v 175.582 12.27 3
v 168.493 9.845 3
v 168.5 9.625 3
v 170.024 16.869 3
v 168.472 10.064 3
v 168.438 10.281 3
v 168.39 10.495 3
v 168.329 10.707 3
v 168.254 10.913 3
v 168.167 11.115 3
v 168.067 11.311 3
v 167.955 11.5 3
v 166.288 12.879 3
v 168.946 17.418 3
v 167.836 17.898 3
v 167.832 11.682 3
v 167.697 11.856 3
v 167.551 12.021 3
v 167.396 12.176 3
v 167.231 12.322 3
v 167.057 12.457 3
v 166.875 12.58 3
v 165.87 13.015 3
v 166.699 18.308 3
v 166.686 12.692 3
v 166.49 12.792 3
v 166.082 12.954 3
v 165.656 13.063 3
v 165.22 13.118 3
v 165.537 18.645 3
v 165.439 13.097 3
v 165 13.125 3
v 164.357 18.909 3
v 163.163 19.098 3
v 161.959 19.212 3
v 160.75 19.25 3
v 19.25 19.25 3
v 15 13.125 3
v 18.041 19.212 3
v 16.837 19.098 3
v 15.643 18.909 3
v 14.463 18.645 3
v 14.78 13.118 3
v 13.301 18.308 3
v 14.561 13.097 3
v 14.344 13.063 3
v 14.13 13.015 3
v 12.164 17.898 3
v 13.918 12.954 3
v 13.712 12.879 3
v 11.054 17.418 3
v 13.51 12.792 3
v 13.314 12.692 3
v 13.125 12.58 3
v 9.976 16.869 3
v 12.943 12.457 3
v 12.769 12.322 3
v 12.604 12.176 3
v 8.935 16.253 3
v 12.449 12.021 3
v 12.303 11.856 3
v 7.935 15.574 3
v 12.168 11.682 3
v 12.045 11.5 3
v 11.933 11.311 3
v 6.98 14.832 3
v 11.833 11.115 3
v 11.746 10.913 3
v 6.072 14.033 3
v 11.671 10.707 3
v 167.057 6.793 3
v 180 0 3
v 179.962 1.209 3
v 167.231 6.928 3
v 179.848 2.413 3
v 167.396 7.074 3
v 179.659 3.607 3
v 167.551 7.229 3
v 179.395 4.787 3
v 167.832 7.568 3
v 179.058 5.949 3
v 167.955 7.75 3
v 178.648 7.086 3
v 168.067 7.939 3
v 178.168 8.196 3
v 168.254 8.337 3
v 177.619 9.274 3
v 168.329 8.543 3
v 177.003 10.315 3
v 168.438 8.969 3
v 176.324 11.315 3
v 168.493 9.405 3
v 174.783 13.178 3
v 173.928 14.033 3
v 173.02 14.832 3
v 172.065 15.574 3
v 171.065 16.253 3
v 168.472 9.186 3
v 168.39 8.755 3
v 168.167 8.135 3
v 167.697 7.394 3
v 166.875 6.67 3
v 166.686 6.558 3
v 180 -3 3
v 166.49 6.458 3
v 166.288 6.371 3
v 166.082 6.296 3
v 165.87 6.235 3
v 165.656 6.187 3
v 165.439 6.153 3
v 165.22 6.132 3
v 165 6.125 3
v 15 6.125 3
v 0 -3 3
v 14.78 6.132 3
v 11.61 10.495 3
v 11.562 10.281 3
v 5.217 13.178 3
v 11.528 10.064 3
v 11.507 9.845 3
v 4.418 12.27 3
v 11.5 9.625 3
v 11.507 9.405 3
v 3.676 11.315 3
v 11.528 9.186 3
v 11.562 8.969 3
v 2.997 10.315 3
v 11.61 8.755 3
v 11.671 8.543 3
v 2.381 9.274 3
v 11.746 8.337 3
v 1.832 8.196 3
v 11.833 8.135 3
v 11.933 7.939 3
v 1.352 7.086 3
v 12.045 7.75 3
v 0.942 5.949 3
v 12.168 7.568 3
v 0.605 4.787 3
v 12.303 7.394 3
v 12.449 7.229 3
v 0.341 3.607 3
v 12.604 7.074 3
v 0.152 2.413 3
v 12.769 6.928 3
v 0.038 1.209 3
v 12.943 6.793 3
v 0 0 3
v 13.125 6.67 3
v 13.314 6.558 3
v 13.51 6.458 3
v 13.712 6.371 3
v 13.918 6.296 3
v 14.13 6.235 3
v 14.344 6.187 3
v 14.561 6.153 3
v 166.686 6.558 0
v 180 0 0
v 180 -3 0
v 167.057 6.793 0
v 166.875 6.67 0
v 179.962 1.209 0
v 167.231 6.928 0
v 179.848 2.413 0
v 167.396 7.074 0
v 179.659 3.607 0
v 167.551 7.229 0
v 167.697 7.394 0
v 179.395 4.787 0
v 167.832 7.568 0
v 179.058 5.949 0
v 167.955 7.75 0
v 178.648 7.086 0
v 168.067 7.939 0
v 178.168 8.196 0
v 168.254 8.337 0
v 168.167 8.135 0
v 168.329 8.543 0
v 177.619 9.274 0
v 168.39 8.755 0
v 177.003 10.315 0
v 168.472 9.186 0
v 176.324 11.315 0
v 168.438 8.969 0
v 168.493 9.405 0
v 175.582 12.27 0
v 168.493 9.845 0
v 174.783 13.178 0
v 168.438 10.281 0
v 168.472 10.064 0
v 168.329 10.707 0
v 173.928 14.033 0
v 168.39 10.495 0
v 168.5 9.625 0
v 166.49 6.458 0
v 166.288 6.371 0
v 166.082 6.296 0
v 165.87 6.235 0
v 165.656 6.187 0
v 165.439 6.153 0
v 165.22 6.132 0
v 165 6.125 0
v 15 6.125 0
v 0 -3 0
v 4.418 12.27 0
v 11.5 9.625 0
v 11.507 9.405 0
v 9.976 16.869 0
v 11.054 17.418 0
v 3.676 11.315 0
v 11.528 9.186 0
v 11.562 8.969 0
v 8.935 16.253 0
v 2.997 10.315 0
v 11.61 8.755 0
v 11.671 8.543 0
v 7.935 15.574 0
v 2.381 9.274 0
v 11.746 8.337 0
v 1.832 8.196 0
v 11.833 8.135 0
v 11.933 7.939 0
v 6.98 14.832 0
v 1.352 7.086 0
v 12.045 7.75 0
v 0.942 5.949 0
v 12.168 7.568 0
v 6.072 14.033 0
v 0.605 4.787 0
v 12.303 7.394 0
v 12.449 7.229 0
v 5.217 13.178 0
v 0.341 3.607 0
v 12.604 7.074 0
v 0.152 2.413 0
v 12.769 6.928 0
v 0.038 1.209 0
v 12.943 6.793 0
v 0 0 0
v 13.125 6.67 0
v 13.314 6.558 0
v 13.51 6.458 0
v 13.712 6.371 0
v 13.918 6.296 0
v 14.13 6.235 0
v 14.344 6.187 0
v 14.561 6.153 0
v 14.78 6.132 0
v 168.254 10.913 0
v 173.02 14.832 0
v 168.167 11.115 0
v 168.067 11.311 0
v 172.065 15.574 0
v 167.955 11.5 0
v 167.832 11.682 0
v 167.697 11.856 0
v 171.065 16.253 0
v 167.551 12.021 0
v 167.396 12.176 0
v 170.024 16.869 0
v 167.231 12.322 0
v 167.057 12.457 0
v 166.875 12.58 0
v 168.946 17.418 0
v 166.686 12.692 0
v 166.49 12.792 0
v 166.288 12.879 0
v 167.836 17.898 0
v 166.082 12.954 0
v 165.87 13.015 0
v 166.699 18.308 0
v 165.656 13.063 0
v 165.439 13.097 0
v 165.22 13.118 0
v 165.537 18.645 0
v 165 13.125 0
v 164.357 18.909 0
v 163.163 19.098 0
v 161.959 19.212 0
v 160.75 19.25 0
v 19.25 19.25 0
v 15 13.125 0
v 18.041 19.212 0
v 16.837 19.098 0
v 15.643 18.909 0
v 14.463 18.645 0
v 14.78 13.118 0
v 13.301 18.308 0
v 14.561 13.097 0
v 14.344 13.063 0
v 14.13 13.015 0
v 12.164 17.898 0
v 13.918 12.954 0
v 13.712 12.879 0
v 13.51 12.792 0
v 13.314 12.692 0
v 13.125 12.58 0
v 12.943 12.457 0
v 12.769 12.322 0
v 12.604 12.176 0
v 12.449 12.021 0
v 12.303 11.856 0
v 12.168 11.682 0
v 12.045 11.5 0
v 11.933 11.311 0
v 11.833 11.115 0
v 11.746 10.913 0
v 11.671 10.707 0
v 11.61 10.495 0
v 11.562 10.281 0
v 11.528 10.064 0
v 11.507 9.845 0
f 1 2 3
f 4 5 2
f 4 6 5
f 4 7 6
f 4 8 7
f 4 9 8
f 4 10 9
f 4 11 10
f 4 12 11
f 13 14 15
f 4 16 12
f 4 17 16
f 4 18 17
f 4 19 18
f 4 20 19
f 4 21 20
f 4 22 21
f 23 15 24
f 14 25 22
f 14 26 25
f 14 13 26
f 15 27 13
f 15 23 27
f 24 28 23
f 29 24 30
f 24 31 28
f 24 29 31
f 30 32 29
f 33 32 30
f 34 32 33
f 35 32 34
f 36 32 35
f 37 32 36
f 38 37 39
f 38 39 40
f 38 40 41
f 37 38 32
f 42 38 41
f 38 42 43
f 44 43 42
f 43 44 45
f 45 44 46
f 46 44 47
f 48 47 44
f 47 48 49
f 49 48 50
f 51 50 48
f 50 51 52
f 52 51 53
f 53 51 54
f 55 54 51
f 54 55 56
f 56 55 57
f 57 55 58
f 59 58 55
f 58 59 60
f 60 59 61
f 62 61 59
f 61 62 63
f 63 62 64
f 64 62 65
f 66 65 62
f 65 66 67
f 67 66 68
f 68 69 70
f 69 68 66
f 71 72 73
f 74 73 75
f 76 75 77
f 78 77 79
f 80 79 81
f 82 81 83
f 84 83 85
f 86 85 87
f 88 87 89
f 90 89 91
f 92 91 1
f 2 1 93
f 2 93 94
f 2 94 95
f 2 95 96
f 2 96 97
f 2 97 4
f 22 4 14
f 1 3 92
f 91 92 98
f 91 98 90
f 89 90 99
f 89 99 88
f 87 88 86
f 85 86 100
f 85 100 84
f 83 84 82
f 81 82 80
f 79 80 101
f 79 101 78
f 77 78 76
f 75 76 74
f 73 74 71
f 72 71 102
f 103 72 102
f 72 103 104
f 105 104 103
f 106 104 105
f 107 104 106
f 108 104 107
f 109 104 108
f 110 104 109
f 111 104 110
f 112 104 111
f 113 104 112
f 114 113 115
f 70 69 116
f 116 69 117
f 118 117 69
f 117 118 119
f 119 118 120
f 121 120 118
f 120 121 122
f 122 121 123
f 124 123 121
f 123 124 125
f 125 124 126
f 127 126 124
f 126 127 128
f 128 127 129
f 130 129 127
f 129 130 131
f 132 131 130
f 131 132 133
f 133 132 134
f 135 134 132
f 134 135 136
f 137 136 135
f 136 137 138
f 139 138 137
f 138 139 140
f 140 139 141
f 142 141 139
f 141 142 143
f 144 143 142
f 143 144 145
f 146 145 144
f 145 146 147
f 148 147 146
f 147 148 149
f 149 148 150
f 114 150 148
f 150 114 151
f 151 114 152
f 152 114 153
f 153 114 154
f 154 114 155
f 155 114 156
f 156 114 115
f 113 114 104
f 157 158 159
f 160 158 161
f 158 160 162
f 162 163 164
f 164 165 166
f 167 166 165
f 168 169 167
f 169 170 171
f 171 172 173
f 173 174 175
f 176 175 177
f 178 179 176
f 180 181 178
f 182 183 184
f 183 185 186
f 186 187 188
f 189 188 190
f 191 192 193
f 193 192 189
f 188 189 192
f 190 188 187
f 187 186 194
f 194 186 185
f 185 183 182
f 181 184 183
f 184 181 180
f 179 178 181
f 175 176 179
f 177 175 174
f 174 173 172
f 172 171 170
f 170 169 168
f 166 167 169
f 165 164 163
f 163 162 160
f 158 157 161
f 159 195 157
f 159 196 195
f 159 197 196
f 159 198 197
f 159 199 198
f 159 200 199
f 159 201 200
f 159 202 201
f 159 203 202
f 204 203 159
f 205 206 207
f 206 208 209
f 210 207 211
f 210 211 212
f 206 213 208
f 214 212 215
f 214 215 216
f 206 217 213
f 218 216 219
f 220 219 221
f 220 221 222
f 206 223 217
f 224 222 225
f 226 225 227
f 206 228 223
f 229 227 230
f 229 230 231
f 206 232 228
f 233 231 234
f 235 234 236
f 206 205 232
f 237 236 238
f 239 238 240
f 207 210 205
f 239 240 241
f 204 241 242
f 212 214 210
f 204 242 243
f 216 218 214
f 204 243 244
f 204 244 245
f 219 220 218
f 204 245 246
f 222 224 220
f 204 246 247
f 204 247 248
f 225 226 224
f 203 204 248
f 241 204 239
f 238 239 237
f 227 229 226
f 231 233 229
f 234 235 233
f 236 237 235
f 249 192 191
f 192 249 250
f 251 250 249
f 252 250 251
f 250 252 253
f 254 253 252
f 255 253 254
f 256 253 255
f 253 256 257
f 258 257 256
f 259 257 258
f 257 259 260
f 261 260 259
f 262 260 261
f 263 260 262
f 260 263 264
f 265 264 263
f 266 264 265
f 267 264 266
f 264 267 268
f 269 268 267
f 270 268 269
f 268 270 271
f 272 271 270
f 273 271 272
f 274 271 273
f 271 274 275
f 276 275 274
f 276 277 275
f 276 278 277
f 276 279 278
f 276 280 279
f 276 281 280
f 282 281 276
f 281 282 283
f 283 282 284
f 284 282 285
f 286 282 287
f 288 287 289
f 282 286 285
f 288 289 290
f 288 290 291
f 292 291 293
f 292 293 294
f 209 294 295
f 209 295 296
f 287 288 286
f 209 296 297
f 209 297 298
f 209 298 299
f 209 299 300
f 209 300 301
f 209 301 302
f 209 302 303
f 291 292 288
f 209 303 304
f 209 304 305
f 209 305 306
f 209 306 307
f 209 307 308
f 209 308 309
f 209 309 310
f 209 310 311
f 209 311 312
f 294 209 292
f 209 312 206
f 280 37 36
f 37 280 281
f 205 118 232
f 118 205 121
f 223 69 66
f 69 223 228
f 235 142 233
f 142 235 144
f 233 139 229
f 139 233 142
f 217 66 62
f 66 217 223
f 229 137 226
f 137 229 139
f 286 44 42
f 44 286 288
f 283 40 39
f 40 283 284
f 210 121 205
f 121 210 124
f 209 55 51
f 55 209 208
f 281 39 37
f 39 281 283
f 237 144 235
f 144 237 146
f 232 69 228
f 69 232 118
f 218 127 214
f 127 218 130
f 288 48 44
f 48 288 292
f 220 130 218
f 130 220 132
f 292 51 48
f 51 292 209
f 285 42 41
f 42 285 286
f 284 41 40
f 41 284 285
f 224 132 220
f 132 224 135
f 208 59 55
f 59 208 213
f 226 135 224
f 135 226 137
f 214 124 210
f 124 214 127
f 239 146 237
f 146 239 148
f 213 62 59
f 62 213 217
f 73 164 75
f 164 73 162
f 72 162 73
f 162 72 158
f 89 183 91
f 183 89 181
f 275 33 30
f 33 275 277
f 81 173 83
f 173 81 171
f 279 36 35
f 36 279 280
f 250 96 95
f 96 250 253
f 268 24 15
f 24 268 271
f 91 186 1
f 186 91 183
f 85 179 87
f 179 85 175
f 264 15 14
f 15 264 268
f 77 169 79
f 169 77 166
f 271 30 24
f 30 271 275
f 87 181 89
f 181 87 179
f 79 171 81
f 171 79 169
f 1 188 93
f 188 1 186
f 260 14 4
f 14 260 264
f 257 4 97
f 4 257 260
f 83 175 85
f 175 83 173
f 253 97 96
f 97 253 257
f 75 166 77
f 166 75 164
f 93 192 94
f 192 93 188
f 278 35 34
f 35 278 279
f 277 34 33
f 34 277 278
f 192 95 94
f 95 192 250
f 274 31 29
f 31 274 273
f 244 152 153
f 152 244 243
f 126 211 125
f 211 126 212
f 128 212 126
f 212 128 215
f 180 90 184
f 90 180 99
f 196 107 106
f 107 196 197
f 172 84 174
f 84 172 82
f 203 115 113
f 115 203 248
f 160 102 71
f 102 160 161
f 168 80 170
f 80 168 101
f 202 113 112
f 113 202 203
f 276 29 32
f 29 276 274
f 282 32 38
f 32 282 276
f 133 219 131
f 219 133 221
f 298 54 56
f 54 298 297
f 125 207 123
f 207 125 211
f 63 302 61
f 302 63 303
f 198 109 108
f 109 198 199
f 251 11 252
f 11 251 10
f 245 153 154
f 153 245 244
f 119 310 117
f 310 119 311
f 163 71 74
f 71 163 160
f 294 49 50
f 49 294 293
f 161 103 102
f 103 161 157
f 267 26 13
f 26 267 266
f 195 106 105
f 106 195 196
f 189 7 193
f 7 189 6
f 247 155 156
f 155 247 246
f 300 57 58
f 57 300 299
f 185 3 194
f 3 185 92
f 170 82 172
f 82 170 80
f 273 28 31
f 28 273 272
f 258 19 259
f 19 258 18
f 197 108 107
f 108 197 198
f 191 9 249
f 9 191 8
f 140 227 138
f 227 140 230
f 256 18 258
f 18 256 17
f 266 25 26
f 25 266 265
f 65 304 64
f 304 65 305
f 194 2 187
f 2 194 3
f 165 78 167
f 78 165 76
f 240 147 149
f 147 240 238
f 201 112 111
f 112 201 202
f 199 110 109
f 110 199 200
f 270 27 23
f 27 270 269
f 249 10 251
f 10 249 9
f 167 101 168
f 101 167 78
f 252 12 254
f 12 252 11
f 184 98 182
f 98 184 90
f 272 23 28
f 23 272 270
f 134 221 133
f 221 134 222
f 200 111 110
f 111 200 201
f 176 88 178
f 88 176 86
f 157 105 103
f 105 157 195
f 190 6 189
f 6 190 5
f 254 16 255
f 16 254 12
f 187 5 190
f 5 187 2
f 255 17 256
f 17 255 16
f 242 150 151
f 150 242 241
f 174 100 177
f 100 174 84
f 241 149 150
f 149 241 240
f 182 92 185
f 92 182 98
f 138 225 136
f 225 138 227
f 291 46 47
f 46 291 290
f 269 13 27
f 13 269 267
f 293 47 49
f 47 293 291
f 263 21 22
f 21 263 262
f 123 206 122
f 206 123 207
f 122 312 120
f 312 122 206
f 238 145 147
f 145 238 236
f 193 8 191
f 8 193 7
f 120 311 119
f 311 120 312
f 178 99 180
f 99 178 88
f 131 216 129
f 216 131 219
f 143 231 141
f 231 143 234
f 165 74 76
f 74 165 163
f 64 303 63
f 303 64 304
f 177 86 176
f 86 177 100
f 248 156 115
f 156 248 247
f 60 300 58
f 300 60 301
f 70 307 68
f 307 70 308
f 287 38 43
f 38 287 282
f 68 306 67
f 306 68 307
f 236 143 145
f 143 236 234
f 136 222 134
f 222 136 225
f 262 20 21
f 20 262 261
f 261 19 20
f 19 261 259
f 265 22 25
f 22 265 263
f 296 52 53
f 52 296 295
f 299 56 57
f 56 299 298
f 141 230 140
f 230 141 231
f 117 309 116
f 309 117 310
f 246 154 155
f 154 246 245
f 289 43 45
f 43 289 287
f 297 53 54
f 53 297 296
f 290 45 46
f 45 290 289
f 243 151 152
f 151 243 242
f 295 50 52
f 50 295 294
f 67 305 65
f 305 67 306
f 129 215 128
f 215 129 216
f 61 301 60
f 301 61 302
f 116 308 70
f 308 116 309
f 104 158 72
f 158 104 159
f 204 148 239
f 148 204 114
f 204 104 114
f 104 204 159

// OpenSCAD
// Daniel Seijas Iglesias <seijasdeveloper@gmail.com>
// soporte movimiento motor

$fn = 100;

s_grosor = 6;
s_largo = 60;

s_extra_motor = 2;

extra_grosor = 1;

largo = 180;
ancho = (s_grosor+extra_grosor)*2.75;
grosor = 3;

difference(){
    // Base con esquinas redondeadas
    union(){
        translate([ancho, 0, 0])
            cube([largo-ancho*2, ancho, grosor]);
        
        translate([ancho, 0, 0])
            cylinder(r=ancho, h=grosor);
        
        translate([largo-ancho, 0, 0])
            cylinder(r=ancho, h=grosor);
    }
    
    // resta circunferencias
    translate([0, -ancho, -0.05])
        cube([largo, ancho, grosor+0.1]);
    
    // resta centro
    translate([(largo-s_largo*2.5)/2, ancho/2, -0.05])
        hull(){
            cylinder(d=s_grosor+extra_grosor, grosor+0.1);
            
            translate([s_largo*2.5, 0, 0])
                cylinder(d=s_grosor+extra_grosor, grosor+0.1);
        }
}
// suma extra
translate([0, -grosor, 0])
    cube([largo, grosor, grosor]);
